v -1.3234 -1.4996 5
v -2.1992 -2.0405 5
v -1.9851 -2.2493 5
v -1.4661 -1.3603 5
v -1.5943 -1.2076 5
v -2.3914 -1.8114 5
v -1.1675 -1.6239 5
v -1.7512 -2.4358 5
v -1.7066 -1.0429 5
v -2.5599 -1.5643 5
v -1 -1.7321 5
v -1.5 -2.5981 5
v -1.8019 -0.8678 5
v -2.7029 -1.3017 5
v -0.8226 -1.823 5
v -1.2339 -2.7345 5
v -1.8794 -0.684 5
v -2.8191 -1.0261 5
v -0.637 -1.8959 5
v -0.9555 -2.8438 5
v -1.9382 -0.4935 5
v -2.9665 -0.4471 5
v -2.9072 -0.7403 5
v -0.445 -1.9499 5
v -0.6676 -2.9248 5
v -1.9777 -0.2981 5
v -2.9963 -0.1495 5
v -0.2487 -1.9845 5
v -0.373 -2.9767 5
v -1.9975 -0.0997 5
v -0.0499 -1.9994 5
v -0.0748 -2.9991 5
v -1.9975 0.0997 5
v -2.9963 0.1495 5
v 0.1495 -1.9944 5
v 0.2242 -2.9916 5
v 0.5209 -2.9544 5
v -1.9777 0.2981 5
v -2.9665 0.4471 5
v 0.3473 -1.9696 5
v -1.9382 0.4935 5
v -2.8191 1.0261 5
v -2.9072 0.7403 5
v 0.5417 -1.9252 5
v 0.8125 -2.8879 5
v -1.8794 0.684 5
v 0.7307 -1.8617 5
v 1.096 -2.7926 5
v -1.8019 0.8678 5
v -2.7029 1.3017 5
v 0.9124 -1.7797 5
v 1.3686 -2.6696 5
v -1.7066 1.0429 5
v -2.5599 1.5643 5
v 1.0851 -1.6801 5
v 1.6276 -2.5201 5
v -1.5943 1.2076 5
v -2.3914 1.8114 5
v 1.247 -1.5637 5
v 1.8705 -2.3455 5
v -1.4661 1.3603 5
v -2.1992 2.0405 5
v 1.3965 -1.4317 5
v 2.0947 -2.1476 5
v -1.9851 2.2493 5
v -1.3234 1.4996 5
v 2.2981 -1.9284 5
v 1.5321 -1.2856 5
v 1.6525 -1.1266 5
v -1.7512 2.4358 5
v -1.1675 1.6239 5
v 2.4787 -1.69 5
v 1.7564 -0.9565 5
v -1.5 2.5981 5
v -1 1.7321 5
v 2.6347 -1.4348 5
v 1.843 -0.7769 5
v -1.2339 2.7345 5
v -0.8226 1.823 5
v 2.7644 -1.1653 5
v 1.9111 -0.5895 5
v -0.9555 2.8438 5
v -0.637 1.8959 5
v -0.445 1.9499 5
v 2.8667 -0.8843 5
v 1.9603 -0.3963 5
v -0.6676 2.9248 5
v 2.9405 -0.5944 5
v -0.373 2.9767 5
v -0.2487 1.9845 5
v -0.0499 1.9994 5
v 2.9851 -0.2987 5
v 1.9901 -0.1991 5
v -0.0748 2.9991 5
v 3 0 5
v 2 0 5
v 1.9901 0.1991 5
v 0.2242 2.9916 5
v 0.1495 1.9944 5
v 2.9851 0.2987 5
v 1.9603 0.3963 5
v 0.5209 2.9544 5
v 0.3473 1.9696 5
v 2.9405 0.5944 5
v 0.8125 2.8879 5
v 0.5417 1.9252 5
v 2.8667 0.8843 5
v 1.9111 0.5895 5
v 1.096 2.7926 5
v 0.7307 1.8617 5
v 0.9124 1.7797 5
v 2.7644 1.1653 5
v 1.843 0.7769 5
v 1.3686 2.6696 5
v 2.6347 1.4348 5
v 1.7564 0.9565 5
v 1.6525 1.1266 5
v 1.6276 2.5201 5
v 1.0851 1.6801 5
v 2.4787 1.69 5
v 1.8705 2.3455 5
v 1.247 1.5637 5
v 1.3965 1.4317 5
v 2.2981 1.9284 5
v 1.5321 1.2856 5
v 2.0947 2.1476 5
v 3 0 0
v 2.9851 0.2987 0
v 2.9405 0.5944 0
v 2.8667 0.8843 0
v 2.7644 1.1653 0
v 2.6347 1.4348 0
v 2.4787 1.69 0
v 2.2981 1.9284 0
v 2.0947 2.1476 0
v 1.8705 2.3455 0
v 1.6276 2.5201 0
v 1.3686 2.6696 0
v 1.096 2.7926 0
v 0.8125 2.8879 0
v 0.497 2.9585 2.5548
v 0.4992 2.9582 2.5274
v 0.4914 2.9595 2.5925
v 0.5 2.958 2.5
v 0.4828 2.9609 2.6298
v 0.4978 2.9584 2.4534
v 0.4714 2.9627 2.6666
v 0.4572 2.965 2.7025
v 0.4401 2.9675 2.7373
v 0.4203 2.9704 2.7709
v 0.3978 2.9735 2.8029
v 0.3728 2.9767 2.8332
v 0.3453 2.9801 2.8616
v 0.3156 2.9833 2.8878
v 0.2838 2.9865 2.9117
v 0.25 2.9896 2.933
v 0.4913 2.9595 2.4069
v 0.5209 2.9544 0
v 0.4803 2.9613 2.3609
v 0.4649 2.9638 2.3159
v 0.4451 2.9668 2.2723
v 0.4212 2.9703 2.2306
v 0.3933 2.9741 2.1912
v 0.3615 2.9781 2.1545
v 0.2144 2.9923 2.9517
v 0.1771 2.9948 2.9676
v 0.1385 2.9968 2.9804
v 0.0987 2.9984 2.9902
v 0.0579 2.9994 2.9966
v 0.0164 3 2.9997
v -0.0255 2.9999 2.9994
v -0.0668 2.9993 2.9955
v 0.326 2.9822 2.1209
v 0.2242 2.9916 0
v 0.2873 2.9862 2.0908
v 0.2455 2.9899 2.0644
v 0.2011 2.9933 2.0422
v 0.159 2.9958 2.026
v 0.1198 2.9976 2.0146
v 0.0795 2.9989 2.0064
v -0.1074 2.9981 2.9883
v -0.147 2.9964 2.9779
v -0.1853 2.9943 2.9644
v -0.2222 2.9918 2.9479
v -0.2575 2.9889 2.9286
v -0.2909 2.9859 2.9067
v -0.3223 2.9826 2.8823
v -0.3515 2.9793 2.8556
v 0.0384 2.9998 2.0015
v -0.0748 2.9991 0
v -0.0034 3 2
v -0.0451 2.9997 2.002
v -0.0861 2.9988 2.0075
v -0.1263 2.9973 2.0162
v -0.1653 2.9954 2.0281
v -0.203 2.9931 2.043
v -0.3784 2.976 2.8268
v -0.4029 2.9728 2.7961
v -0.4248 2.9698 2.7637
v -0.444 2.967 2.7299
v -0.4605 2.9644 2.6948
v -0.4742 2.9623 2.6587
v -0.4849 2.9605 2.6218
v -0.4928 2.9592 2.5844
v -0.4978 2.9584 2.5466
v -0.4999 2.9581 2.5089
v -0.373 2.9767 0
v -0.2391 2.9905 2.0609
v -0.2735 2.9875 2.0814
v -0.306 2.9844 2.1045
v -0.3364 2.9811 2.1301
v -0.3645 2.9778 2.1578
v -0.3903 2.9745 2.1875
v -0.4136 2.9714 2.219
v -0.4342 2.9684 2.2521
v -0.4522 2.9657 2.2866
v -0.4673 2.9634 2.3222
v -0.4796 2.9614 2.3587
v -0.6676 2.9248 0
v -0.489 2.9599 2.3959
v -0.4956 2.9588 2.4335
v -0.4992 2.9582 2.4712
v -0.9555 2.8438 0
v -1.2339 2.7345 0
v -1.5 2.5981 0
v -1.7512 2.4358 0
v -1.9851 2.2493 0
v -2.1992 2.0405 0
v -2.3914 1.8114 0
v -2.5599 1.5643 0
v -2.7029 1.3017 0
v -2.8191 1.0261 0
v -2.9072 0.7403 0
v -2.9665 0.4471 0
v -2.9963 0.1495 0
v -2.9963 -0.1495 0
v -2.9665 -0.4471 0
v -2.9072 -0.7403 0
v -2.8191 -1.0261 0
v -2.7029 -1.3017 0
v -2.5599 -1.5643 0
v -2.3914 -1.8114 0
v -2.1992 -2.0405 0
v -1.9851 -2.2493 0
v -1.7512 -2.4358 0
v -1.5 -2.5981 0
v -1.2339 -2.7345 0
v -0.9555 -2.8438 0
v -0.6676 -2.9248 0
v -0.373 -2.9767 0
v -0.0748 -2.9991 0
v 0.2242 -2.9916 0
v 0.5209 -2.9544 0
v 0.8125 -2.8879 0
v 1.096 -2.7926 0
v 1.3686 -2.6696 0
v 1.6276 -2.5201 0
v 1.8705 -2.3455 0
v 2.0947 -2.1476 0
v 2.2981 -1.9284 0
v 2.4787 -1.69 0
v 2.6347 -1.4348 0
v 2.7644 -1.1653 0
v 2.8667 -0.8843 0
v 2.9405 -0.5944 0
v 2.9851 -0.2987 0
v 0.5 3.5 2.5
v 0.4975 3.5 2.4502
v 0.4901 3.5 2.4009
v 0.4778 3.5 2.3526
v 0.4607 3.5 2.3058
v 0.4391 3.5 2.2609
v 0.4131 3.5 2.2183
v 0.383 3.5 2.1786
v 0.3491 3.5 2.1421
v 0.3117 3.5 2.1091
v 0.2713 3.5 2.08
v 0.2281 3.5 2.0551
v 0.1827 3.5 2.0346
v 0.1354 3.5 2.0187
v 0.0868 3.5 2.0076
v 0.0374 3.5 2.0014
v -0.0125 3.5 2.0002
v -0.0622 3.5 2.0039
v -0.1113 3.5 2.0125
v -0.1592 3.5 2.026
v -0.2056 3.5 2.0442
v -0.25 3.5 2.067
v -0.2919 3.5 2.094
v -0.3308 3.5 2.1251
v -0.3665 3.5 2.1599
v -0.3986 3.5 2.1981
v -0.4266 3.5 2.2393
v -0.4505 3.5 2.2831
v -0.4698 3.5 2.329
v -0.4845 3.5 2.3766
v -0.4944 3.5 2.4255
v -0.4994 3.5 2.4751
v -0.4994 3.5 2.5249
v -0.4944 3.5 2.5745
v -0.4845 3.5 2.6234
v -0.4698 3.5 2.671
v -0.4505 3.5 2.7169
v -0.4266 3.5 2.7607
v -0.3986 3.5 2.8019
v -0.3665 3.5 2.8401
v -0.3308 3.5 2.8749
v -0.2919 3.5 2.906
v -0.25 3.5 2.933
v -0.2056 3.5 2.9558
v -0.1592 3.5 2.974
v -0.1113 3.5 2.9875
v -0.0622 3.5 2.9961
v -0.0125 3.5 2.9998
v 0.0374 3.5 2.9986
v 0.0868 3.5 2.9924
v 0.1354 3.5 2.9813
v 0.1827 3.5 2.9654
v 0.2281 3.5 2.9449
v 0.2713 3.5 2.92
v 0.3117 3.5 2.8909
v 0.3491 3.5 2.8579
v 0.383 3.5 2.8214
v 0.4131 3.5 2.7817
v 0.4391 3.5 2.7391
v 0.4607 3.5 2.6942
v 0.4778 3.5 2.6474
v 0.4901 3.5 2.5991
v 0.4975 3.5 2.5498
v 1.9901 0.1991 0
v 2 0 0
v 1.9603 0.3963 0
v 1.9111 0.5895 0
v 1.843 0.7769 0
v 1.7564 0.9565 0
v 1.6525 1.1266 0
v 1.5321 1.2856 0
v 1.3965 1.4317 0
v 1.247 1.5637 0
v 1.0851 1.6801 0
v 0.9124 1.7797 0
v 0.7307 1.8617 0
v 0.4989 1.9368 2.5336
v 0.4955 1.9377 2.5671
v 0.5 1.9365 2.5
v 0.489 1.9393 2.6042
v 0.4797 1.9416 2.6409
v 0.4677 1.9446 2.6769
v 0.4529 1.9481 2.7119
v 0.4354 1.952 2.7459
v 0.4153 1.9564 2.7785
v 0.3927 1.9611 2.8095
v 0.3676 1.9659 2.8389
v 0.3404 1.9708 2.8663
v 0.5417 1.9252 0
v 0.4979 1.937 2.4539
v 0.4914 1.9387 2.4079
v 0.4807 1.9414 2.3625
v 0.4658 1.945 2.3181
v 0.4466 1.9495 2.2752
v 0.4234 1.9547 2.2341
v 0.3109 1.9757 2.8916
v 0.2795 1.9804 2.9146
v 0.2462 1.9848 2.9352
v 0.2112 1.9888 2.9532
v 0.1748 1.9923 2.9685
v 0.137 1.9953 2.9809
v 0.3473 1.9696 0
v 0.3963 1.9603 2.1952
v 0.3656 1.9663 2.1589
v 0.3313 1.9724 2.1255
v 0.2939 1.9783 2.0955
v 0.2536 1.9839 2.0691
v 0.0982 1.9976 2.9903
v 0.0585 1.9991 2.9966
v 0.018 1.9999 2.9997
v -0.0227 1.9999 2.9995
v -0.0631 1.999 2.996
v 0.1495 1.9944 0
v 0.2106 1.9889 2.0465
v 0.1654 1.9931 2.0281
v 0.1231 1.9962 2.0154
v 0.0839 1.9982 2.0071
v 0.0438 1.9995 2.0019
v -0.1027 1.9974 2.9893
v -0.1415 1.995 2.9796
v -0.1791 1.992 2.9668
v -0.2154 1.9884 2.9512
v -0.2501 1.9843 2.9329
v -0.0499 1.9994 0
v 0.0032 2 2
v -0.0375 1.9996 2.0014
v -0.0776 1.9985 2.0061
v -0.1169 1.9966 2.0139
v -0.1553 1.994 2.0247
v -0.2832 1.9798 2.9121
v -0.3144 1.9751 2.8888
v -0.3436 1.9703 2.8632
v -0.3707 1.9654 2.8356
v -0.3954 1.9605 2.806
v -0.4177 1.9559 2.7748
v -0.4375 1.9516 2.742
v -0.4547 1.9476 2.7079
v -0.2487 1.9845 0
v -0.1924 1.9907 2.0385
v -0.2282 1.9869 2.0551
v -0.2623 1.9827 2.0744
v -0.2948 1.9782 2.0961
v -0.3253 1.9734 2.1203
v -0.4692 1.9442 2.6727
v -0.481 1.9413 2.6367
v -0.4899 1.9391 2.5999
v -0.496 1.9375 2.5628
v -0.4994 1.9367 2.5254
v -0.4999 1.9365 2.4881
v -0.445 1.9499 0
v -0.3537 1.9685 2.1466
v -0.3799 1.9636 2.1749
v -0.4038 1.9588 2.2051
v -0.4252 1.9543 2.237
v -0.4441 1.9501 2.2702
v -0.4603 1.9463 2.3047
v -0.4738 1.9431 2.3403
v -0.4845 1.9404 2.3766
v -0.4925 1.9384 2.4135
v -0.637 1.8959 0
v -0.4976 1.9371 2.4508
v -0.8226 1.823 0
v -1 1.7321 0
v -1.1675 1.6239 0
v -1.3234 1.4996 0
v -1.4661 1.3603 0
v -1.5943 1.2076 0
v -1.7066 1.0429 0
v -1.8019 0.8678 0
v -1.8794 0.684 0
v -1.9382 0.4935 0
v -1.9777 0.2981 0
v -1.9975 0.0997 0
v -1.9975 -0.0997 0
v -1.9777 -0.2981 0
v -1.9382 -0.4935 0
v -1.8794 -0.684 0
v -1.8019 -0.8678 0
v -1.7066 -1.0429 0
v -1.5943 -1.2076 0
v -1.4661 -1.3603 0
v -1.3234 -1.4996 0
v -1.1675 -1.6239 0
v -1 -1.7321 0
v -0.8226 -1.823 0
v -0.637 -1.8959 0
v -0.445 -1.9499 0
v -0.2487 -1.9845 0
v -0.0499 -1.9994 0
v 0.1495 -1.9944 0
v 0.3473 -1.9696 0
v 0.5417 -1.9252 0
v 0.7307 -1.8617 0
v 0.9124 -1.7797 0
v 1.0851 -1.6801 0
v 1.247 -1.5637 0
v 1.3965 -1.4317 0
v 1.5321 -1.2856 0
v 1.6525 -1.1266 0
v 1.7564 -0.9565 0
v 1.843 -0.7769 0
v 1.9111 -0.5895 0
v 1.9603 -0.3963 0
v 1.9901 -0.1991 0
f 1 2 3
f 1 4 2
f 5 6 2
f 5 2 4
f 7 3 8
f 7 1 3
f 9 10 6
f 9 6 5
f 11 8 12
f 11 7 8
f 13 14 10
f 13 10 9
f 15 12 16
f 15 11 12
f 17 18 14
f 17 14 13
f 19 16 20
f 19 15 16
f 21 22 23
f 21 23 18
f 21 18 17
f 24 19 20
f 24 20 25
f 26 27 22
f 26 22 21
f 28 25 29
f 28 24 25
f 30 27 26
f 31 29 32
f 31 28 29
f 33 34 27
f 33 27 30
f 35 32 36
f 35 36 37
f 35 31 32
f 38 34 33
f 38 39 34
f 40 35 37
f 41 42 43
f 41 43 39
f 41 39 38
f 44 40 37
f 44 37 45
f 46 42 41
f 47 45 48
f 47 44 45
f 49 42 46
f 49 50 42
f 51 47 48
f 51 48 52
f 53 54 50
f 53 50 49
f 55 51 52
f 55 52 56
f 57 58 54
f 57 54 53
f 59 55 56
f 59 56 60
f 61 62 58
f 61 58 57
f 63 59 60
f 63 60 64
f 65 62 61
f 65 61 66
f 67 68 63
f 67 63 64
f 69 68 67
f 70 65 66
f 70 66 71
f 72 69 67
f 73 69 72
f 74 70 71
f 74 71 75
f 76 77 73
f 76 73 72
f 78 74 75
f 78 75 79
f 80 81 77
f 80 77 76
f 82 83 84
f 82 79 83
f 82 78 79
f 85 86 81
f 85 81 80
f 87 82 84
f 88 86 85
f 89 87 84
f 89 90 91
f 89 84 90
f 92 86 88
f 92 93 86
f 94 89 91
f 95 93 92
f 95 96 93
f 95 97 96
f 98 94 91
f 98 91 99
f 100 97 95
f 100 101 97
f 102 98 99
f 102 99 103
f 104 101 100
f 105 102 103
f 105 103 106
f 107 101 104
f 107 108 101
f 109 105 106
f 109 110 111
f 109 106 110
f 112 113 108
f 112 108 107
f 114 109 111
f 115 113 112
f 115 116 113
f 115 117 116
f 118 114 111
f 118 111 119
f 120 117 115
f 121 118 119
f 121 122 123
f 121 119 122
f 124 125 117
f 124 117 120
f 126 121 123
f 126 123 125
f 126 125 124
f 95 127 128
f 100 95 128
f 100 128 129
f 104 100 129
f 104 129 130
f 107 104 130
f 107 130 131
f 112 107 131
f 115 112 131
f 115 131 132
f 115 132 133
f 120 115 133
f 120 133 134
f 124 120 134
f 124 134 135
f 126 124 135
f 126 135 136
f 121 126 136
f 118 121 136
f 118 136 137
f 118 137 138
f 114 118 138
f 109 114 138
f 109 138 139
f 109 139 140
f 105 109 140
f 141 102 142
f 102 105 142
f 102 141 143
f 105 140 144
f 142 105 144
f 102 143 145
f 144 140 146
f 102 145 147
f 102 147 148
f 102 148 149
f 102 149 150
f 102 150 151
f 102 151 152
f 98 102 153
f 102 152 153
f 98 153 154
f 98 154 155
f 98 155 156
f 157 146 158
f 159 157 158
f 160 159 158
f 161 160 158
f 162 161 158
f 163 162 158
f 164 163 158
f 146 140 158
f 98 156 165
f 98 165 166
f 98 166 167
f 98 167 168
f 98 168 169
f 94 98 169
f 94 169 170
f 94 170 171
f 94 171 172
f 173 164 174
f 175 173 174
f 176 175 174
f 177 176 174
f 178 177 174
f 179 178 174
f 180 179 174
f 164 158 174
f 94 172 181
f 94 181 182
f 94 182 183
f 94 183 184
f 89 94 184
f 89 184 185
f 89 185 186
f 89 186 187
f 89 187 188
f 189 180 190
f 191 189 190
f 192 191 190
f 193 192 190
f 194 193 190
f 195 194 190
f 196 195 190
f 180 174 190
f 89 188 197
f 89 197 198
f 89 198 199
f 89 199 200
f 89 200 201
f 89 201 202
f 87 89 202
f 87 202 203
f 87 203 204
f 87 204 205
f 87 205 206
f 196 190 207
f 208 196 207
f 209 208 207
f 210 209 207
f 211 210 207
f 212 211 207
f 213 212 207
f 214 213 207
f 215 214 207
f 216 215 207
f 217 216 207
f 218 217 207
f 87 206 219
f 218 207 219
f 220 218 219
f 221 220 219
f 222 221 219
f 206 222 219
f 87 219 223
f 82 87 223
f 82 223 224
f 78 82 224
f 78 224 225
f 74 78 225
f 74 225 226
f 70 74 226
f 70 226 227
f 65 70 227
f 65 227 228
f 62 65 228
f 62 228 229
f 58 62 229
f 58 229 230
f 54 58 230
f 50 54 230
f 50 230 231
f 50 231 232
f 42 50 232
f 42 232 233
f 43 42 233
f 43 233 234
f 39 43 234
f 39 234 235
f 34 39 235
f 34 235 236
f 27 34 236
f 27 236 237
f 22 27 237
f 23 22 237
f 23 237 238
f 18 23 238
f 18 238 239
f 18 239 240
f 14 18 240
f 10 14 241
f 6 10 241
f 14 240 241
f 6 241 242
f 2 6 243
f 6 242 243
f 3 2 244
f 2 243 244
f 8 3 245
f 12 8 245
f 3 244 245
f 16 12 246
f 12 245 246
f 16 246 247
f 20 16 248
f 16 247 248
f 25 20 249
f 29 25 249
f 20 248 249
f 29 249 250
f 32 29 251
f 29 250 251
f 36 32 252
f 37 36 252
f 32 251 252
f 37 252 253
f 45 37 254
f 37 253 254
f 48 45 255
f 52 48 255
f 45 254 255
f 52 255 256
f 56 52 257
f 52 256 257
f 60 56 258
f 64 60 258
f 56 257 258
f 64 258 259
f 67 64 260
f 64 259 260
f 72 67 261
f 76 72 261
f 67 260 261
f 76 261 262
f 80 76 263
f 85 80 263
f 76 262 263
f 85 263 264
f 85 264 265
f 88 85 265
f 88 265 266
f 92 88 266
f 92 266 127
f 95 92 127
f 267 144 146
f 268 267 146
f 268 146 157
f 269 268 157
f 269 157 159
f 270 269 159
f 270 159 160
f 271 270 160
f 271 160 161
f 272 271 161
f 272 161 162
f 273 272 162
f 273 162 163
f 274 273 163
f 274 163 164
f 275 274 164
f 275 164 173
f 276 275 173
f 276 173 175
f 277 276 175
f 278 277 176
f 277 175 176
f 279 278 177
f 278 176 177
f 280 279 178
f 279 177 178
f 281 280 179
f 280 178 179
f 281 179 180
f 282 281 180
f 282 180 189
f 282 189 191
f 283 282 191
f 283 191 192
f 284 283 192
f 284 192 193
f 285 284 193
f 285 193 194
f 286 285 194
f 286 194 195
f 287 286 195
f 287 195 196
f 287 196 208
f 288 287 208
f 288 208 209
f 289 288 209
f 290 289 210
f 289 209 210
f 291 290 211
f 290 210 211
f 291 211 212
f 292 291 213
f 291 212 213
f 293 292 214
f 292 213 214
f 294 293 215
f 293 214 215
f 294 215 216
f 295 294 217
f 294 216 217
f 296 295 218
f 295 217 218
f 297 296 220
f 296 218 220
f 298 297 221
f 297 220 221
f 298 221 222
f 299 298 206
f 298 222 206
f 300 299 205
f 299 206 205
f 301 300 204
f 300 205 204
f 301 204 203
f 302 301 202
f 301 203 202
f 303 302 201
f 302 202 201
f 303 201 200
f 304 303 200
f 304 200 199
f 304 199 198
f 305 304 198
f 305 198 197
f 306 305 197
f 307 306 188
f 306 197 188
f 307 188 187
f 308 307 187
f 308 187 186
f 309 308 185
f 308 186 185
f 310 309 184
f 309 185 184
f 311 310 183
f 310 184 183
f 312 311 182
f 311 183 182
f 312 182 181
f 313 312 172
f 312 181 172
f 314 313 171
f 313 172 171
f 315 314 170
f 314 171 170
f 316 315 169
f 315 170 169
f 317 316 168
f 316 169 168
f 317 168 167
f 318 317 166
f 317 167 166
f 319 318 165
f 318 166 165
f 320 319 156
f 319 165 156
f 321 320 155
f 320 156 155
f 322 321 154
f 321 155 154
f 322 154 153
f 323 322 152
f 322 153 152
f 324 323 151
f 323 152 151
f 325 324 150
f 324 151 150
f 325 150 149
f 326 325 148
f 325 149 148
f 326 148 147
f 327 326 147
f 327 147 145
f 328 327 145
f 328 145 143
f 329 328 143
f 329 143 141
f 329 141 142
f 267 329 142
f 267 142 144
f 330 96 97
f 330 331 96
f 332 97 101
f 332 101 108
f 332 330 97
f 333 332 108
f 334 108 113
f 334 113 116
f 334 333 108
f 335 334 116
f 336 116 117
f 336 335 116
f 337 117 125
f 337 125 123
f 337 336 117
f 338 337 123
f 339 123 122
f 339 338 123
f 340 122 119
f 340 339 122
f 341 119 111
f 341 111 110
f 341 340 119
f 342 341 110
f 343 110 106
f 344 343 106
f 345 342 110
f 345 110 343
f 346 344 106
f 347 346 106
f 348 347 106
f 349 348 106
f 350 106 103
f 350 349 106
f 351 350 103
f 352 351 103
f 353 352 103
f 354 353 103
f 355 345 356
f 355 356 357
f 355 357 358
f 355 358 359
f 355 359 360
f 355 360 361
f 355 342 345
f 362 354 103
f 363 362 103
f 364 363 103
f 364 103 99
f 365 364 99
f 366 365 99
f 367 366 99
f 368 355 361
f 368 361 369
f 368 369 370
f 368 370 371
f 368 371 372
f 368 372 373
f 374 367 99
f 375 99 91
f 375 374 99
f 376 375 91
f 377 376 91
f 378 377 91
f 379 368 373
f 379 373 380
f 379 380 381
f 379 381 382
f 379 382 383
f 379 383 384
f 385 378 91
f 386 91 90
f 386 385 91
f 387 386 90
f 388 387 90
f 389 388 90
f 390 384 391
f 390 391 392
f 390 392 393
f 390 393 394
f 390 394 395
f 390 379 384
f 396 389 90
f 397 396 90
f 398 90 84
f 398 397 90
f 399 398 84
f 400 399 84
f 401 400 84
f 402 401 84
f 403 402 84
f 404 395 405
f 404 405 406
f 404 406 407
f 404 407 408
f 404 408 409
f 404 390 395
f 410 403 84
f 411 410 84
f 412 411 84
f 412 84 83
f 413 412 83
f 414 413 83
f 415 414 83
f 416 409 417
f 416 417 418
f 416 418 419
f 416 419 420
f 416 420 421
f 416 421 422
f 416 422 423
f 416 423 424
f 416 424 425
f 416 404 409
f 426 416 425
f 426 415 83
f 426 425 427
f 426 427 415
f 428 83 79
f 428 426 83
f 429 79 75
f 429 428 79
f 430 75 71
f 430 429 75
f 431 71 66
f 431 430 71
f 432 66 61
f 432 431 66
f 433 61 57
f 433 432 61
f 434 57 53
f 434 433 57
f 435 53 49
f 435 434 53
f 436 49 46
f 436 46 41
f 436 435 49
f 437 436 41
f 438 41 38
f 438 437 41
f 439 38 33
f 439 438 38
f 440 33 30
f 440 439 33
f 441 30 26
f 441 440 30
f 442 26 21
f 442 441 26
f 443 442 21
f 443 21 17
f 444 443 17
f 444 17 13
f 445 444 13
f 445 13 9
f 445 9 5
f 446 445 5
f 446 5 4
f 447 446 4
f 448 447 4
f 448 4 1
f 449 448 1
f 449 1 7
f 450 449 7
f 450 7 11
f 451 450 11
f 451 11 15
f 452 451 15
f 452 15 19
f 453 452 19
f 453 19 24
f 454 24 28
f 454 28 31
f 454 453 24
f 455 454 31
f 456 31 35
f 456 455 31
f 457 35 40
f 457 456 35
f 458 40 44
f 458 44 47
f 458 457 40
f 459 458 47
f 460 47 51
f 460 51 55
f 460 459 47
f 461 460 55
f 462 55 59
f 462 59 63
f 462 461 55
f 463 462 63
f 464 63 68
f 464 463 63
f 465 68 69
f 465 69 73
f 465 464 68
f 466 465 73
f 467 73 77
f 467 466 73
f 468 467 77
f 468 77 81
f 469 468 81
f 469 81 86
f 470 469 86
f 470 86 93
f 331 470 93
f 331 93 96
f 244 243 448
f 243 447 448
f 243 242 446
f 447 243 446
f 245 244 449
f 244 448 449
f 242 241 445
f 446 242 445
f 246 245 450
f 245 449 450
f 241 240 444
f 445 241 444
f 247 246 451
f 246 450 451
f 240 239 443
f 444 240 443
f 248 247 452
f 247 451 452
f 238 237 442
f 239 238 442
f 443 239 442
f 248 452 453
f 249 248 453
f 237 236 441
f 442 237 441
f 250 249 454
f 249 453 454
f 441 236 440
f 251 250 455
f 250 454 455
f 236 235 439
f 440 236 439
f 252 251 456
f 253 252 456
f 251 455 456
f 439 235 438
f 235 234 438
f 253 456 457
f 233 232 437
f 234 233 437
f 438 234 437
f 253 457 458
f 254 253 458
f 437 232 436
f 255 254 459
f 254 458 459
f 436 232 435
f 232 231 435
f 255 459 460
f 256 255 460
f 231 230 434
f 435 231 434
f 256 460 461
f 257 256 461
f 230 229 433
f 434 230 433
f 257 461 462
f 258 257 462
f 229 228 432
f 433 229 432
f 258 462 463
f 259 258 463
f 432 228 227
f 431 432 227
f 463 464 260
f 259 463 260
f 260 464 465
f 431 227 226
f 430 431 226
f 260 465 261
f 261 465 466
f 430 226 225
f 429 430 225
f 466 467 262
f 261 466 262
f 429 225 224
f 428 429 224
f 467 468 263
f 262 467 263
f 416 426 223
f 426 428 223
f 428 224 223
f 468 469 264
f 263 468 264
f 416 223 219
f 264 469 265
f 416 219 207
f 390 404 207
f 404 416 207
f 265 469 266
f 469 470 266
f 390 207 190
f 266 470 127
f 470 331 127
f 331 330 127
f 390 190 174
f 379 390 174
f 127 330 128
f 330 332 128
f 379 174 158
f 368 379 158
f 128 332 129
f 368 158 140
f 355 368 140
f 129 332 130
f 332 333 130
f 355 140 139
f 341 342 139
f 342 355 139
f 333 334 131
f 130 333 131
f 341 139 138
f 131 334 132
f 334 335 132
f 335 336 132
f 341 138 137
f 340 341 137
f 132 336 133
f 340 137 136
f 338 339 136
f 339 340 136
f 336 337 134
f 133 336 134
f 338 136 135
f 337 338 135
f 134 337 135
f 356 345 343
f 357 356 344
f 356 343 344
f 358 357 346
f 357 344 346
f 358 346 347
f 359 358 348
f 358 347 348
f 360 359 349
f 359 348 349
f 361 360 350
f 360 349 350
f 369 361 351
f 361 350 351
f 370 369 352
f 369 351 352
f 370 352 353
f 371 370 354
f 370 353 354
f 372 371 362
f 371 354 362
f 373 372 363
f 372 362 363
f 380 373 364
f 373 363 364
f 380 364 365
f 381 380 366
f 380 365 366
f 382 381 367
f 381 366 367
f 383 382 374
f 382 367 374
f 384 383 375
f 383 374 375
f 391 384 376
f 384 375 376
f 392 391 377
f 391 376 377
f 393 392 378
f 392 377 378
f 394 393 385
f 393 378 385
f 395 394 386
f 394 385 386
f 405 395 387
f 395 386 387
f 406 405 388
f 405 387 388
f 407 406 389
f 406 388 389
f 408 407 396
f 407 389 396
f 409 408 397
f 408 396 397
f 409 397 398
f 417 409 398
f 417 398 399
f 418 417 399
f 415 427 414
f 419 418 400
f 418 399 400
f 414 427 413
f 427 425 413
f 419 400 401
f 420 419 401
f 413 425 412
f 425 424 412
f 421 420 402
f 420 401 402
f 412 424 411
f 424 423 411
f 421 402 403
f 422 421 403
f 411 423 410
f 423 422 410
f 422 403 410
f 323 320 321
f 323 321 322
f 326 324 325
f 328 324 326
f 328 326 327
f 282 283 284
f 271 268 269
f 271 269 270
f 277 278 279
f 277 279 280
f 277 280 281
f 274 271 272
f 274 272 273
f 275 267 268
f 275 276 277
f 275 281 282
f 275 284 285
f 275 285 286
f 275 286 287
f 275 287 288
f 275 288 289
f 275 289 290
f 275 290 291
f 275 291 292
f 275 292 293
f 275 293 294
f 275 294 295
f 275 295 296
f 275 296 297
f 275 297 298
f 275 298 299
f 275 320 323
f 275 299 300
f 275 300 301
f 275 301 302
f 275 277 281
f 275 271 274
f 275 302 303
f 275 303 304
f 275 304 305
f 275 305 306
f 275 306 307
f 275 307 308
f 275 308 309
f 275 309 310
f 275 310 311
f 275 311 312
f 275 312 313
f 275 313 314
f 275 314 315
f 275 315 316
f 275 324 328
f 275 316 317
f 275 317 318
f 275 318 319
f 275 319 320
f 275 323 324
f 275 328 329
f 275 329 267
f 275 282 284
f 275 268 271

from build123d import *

# Parameters (mm, degrees)
SKETCH_1_R          = 3
SKETCH_1_R_2        = 2
EXTRUDE_1_DEPTH     = 5
SKETCH_2_R          = 0.5
EXTRUDE_2_DEPTH     = 3.5
SKETCH_3_R          = 2
CUT_EXTRUDE_1_DEPTH = 3.5


with BuildPart() as part:
    # 草图1 → 凸台-拉伸1 (new body)
    with BuildSketch(Plane.XY):
        Circle(SKETCH_1_R)
        Circle(SKETCH_1_R_2, mode=Mode.SUBTRACT)
    extrude(amount=EXTRUDE_1_DEPTH)

    # 草图2 → 凸台-拉伸2 (add)
    with BuildSketch(Plane(origin=(0, 0, 0), x_dir=(1, 0, 0), z_dir=(0, 1, 0))):
        with Locations((0, -2.5)):
            Circle(SKETCH_2_R)
    extrude(amount=EXTRUDE_2_DEPTH)

    # 草图3 → 切除-拉伸1 (cut)
    with BuildSketch(Plane.XY.offset(5)):
        Circle(SKETCH_3_R)
    extrude(amount=-CUT_EXTRUDE_1_DEPTH, mode=Mode.SUBTRACT)


solid = part.part
